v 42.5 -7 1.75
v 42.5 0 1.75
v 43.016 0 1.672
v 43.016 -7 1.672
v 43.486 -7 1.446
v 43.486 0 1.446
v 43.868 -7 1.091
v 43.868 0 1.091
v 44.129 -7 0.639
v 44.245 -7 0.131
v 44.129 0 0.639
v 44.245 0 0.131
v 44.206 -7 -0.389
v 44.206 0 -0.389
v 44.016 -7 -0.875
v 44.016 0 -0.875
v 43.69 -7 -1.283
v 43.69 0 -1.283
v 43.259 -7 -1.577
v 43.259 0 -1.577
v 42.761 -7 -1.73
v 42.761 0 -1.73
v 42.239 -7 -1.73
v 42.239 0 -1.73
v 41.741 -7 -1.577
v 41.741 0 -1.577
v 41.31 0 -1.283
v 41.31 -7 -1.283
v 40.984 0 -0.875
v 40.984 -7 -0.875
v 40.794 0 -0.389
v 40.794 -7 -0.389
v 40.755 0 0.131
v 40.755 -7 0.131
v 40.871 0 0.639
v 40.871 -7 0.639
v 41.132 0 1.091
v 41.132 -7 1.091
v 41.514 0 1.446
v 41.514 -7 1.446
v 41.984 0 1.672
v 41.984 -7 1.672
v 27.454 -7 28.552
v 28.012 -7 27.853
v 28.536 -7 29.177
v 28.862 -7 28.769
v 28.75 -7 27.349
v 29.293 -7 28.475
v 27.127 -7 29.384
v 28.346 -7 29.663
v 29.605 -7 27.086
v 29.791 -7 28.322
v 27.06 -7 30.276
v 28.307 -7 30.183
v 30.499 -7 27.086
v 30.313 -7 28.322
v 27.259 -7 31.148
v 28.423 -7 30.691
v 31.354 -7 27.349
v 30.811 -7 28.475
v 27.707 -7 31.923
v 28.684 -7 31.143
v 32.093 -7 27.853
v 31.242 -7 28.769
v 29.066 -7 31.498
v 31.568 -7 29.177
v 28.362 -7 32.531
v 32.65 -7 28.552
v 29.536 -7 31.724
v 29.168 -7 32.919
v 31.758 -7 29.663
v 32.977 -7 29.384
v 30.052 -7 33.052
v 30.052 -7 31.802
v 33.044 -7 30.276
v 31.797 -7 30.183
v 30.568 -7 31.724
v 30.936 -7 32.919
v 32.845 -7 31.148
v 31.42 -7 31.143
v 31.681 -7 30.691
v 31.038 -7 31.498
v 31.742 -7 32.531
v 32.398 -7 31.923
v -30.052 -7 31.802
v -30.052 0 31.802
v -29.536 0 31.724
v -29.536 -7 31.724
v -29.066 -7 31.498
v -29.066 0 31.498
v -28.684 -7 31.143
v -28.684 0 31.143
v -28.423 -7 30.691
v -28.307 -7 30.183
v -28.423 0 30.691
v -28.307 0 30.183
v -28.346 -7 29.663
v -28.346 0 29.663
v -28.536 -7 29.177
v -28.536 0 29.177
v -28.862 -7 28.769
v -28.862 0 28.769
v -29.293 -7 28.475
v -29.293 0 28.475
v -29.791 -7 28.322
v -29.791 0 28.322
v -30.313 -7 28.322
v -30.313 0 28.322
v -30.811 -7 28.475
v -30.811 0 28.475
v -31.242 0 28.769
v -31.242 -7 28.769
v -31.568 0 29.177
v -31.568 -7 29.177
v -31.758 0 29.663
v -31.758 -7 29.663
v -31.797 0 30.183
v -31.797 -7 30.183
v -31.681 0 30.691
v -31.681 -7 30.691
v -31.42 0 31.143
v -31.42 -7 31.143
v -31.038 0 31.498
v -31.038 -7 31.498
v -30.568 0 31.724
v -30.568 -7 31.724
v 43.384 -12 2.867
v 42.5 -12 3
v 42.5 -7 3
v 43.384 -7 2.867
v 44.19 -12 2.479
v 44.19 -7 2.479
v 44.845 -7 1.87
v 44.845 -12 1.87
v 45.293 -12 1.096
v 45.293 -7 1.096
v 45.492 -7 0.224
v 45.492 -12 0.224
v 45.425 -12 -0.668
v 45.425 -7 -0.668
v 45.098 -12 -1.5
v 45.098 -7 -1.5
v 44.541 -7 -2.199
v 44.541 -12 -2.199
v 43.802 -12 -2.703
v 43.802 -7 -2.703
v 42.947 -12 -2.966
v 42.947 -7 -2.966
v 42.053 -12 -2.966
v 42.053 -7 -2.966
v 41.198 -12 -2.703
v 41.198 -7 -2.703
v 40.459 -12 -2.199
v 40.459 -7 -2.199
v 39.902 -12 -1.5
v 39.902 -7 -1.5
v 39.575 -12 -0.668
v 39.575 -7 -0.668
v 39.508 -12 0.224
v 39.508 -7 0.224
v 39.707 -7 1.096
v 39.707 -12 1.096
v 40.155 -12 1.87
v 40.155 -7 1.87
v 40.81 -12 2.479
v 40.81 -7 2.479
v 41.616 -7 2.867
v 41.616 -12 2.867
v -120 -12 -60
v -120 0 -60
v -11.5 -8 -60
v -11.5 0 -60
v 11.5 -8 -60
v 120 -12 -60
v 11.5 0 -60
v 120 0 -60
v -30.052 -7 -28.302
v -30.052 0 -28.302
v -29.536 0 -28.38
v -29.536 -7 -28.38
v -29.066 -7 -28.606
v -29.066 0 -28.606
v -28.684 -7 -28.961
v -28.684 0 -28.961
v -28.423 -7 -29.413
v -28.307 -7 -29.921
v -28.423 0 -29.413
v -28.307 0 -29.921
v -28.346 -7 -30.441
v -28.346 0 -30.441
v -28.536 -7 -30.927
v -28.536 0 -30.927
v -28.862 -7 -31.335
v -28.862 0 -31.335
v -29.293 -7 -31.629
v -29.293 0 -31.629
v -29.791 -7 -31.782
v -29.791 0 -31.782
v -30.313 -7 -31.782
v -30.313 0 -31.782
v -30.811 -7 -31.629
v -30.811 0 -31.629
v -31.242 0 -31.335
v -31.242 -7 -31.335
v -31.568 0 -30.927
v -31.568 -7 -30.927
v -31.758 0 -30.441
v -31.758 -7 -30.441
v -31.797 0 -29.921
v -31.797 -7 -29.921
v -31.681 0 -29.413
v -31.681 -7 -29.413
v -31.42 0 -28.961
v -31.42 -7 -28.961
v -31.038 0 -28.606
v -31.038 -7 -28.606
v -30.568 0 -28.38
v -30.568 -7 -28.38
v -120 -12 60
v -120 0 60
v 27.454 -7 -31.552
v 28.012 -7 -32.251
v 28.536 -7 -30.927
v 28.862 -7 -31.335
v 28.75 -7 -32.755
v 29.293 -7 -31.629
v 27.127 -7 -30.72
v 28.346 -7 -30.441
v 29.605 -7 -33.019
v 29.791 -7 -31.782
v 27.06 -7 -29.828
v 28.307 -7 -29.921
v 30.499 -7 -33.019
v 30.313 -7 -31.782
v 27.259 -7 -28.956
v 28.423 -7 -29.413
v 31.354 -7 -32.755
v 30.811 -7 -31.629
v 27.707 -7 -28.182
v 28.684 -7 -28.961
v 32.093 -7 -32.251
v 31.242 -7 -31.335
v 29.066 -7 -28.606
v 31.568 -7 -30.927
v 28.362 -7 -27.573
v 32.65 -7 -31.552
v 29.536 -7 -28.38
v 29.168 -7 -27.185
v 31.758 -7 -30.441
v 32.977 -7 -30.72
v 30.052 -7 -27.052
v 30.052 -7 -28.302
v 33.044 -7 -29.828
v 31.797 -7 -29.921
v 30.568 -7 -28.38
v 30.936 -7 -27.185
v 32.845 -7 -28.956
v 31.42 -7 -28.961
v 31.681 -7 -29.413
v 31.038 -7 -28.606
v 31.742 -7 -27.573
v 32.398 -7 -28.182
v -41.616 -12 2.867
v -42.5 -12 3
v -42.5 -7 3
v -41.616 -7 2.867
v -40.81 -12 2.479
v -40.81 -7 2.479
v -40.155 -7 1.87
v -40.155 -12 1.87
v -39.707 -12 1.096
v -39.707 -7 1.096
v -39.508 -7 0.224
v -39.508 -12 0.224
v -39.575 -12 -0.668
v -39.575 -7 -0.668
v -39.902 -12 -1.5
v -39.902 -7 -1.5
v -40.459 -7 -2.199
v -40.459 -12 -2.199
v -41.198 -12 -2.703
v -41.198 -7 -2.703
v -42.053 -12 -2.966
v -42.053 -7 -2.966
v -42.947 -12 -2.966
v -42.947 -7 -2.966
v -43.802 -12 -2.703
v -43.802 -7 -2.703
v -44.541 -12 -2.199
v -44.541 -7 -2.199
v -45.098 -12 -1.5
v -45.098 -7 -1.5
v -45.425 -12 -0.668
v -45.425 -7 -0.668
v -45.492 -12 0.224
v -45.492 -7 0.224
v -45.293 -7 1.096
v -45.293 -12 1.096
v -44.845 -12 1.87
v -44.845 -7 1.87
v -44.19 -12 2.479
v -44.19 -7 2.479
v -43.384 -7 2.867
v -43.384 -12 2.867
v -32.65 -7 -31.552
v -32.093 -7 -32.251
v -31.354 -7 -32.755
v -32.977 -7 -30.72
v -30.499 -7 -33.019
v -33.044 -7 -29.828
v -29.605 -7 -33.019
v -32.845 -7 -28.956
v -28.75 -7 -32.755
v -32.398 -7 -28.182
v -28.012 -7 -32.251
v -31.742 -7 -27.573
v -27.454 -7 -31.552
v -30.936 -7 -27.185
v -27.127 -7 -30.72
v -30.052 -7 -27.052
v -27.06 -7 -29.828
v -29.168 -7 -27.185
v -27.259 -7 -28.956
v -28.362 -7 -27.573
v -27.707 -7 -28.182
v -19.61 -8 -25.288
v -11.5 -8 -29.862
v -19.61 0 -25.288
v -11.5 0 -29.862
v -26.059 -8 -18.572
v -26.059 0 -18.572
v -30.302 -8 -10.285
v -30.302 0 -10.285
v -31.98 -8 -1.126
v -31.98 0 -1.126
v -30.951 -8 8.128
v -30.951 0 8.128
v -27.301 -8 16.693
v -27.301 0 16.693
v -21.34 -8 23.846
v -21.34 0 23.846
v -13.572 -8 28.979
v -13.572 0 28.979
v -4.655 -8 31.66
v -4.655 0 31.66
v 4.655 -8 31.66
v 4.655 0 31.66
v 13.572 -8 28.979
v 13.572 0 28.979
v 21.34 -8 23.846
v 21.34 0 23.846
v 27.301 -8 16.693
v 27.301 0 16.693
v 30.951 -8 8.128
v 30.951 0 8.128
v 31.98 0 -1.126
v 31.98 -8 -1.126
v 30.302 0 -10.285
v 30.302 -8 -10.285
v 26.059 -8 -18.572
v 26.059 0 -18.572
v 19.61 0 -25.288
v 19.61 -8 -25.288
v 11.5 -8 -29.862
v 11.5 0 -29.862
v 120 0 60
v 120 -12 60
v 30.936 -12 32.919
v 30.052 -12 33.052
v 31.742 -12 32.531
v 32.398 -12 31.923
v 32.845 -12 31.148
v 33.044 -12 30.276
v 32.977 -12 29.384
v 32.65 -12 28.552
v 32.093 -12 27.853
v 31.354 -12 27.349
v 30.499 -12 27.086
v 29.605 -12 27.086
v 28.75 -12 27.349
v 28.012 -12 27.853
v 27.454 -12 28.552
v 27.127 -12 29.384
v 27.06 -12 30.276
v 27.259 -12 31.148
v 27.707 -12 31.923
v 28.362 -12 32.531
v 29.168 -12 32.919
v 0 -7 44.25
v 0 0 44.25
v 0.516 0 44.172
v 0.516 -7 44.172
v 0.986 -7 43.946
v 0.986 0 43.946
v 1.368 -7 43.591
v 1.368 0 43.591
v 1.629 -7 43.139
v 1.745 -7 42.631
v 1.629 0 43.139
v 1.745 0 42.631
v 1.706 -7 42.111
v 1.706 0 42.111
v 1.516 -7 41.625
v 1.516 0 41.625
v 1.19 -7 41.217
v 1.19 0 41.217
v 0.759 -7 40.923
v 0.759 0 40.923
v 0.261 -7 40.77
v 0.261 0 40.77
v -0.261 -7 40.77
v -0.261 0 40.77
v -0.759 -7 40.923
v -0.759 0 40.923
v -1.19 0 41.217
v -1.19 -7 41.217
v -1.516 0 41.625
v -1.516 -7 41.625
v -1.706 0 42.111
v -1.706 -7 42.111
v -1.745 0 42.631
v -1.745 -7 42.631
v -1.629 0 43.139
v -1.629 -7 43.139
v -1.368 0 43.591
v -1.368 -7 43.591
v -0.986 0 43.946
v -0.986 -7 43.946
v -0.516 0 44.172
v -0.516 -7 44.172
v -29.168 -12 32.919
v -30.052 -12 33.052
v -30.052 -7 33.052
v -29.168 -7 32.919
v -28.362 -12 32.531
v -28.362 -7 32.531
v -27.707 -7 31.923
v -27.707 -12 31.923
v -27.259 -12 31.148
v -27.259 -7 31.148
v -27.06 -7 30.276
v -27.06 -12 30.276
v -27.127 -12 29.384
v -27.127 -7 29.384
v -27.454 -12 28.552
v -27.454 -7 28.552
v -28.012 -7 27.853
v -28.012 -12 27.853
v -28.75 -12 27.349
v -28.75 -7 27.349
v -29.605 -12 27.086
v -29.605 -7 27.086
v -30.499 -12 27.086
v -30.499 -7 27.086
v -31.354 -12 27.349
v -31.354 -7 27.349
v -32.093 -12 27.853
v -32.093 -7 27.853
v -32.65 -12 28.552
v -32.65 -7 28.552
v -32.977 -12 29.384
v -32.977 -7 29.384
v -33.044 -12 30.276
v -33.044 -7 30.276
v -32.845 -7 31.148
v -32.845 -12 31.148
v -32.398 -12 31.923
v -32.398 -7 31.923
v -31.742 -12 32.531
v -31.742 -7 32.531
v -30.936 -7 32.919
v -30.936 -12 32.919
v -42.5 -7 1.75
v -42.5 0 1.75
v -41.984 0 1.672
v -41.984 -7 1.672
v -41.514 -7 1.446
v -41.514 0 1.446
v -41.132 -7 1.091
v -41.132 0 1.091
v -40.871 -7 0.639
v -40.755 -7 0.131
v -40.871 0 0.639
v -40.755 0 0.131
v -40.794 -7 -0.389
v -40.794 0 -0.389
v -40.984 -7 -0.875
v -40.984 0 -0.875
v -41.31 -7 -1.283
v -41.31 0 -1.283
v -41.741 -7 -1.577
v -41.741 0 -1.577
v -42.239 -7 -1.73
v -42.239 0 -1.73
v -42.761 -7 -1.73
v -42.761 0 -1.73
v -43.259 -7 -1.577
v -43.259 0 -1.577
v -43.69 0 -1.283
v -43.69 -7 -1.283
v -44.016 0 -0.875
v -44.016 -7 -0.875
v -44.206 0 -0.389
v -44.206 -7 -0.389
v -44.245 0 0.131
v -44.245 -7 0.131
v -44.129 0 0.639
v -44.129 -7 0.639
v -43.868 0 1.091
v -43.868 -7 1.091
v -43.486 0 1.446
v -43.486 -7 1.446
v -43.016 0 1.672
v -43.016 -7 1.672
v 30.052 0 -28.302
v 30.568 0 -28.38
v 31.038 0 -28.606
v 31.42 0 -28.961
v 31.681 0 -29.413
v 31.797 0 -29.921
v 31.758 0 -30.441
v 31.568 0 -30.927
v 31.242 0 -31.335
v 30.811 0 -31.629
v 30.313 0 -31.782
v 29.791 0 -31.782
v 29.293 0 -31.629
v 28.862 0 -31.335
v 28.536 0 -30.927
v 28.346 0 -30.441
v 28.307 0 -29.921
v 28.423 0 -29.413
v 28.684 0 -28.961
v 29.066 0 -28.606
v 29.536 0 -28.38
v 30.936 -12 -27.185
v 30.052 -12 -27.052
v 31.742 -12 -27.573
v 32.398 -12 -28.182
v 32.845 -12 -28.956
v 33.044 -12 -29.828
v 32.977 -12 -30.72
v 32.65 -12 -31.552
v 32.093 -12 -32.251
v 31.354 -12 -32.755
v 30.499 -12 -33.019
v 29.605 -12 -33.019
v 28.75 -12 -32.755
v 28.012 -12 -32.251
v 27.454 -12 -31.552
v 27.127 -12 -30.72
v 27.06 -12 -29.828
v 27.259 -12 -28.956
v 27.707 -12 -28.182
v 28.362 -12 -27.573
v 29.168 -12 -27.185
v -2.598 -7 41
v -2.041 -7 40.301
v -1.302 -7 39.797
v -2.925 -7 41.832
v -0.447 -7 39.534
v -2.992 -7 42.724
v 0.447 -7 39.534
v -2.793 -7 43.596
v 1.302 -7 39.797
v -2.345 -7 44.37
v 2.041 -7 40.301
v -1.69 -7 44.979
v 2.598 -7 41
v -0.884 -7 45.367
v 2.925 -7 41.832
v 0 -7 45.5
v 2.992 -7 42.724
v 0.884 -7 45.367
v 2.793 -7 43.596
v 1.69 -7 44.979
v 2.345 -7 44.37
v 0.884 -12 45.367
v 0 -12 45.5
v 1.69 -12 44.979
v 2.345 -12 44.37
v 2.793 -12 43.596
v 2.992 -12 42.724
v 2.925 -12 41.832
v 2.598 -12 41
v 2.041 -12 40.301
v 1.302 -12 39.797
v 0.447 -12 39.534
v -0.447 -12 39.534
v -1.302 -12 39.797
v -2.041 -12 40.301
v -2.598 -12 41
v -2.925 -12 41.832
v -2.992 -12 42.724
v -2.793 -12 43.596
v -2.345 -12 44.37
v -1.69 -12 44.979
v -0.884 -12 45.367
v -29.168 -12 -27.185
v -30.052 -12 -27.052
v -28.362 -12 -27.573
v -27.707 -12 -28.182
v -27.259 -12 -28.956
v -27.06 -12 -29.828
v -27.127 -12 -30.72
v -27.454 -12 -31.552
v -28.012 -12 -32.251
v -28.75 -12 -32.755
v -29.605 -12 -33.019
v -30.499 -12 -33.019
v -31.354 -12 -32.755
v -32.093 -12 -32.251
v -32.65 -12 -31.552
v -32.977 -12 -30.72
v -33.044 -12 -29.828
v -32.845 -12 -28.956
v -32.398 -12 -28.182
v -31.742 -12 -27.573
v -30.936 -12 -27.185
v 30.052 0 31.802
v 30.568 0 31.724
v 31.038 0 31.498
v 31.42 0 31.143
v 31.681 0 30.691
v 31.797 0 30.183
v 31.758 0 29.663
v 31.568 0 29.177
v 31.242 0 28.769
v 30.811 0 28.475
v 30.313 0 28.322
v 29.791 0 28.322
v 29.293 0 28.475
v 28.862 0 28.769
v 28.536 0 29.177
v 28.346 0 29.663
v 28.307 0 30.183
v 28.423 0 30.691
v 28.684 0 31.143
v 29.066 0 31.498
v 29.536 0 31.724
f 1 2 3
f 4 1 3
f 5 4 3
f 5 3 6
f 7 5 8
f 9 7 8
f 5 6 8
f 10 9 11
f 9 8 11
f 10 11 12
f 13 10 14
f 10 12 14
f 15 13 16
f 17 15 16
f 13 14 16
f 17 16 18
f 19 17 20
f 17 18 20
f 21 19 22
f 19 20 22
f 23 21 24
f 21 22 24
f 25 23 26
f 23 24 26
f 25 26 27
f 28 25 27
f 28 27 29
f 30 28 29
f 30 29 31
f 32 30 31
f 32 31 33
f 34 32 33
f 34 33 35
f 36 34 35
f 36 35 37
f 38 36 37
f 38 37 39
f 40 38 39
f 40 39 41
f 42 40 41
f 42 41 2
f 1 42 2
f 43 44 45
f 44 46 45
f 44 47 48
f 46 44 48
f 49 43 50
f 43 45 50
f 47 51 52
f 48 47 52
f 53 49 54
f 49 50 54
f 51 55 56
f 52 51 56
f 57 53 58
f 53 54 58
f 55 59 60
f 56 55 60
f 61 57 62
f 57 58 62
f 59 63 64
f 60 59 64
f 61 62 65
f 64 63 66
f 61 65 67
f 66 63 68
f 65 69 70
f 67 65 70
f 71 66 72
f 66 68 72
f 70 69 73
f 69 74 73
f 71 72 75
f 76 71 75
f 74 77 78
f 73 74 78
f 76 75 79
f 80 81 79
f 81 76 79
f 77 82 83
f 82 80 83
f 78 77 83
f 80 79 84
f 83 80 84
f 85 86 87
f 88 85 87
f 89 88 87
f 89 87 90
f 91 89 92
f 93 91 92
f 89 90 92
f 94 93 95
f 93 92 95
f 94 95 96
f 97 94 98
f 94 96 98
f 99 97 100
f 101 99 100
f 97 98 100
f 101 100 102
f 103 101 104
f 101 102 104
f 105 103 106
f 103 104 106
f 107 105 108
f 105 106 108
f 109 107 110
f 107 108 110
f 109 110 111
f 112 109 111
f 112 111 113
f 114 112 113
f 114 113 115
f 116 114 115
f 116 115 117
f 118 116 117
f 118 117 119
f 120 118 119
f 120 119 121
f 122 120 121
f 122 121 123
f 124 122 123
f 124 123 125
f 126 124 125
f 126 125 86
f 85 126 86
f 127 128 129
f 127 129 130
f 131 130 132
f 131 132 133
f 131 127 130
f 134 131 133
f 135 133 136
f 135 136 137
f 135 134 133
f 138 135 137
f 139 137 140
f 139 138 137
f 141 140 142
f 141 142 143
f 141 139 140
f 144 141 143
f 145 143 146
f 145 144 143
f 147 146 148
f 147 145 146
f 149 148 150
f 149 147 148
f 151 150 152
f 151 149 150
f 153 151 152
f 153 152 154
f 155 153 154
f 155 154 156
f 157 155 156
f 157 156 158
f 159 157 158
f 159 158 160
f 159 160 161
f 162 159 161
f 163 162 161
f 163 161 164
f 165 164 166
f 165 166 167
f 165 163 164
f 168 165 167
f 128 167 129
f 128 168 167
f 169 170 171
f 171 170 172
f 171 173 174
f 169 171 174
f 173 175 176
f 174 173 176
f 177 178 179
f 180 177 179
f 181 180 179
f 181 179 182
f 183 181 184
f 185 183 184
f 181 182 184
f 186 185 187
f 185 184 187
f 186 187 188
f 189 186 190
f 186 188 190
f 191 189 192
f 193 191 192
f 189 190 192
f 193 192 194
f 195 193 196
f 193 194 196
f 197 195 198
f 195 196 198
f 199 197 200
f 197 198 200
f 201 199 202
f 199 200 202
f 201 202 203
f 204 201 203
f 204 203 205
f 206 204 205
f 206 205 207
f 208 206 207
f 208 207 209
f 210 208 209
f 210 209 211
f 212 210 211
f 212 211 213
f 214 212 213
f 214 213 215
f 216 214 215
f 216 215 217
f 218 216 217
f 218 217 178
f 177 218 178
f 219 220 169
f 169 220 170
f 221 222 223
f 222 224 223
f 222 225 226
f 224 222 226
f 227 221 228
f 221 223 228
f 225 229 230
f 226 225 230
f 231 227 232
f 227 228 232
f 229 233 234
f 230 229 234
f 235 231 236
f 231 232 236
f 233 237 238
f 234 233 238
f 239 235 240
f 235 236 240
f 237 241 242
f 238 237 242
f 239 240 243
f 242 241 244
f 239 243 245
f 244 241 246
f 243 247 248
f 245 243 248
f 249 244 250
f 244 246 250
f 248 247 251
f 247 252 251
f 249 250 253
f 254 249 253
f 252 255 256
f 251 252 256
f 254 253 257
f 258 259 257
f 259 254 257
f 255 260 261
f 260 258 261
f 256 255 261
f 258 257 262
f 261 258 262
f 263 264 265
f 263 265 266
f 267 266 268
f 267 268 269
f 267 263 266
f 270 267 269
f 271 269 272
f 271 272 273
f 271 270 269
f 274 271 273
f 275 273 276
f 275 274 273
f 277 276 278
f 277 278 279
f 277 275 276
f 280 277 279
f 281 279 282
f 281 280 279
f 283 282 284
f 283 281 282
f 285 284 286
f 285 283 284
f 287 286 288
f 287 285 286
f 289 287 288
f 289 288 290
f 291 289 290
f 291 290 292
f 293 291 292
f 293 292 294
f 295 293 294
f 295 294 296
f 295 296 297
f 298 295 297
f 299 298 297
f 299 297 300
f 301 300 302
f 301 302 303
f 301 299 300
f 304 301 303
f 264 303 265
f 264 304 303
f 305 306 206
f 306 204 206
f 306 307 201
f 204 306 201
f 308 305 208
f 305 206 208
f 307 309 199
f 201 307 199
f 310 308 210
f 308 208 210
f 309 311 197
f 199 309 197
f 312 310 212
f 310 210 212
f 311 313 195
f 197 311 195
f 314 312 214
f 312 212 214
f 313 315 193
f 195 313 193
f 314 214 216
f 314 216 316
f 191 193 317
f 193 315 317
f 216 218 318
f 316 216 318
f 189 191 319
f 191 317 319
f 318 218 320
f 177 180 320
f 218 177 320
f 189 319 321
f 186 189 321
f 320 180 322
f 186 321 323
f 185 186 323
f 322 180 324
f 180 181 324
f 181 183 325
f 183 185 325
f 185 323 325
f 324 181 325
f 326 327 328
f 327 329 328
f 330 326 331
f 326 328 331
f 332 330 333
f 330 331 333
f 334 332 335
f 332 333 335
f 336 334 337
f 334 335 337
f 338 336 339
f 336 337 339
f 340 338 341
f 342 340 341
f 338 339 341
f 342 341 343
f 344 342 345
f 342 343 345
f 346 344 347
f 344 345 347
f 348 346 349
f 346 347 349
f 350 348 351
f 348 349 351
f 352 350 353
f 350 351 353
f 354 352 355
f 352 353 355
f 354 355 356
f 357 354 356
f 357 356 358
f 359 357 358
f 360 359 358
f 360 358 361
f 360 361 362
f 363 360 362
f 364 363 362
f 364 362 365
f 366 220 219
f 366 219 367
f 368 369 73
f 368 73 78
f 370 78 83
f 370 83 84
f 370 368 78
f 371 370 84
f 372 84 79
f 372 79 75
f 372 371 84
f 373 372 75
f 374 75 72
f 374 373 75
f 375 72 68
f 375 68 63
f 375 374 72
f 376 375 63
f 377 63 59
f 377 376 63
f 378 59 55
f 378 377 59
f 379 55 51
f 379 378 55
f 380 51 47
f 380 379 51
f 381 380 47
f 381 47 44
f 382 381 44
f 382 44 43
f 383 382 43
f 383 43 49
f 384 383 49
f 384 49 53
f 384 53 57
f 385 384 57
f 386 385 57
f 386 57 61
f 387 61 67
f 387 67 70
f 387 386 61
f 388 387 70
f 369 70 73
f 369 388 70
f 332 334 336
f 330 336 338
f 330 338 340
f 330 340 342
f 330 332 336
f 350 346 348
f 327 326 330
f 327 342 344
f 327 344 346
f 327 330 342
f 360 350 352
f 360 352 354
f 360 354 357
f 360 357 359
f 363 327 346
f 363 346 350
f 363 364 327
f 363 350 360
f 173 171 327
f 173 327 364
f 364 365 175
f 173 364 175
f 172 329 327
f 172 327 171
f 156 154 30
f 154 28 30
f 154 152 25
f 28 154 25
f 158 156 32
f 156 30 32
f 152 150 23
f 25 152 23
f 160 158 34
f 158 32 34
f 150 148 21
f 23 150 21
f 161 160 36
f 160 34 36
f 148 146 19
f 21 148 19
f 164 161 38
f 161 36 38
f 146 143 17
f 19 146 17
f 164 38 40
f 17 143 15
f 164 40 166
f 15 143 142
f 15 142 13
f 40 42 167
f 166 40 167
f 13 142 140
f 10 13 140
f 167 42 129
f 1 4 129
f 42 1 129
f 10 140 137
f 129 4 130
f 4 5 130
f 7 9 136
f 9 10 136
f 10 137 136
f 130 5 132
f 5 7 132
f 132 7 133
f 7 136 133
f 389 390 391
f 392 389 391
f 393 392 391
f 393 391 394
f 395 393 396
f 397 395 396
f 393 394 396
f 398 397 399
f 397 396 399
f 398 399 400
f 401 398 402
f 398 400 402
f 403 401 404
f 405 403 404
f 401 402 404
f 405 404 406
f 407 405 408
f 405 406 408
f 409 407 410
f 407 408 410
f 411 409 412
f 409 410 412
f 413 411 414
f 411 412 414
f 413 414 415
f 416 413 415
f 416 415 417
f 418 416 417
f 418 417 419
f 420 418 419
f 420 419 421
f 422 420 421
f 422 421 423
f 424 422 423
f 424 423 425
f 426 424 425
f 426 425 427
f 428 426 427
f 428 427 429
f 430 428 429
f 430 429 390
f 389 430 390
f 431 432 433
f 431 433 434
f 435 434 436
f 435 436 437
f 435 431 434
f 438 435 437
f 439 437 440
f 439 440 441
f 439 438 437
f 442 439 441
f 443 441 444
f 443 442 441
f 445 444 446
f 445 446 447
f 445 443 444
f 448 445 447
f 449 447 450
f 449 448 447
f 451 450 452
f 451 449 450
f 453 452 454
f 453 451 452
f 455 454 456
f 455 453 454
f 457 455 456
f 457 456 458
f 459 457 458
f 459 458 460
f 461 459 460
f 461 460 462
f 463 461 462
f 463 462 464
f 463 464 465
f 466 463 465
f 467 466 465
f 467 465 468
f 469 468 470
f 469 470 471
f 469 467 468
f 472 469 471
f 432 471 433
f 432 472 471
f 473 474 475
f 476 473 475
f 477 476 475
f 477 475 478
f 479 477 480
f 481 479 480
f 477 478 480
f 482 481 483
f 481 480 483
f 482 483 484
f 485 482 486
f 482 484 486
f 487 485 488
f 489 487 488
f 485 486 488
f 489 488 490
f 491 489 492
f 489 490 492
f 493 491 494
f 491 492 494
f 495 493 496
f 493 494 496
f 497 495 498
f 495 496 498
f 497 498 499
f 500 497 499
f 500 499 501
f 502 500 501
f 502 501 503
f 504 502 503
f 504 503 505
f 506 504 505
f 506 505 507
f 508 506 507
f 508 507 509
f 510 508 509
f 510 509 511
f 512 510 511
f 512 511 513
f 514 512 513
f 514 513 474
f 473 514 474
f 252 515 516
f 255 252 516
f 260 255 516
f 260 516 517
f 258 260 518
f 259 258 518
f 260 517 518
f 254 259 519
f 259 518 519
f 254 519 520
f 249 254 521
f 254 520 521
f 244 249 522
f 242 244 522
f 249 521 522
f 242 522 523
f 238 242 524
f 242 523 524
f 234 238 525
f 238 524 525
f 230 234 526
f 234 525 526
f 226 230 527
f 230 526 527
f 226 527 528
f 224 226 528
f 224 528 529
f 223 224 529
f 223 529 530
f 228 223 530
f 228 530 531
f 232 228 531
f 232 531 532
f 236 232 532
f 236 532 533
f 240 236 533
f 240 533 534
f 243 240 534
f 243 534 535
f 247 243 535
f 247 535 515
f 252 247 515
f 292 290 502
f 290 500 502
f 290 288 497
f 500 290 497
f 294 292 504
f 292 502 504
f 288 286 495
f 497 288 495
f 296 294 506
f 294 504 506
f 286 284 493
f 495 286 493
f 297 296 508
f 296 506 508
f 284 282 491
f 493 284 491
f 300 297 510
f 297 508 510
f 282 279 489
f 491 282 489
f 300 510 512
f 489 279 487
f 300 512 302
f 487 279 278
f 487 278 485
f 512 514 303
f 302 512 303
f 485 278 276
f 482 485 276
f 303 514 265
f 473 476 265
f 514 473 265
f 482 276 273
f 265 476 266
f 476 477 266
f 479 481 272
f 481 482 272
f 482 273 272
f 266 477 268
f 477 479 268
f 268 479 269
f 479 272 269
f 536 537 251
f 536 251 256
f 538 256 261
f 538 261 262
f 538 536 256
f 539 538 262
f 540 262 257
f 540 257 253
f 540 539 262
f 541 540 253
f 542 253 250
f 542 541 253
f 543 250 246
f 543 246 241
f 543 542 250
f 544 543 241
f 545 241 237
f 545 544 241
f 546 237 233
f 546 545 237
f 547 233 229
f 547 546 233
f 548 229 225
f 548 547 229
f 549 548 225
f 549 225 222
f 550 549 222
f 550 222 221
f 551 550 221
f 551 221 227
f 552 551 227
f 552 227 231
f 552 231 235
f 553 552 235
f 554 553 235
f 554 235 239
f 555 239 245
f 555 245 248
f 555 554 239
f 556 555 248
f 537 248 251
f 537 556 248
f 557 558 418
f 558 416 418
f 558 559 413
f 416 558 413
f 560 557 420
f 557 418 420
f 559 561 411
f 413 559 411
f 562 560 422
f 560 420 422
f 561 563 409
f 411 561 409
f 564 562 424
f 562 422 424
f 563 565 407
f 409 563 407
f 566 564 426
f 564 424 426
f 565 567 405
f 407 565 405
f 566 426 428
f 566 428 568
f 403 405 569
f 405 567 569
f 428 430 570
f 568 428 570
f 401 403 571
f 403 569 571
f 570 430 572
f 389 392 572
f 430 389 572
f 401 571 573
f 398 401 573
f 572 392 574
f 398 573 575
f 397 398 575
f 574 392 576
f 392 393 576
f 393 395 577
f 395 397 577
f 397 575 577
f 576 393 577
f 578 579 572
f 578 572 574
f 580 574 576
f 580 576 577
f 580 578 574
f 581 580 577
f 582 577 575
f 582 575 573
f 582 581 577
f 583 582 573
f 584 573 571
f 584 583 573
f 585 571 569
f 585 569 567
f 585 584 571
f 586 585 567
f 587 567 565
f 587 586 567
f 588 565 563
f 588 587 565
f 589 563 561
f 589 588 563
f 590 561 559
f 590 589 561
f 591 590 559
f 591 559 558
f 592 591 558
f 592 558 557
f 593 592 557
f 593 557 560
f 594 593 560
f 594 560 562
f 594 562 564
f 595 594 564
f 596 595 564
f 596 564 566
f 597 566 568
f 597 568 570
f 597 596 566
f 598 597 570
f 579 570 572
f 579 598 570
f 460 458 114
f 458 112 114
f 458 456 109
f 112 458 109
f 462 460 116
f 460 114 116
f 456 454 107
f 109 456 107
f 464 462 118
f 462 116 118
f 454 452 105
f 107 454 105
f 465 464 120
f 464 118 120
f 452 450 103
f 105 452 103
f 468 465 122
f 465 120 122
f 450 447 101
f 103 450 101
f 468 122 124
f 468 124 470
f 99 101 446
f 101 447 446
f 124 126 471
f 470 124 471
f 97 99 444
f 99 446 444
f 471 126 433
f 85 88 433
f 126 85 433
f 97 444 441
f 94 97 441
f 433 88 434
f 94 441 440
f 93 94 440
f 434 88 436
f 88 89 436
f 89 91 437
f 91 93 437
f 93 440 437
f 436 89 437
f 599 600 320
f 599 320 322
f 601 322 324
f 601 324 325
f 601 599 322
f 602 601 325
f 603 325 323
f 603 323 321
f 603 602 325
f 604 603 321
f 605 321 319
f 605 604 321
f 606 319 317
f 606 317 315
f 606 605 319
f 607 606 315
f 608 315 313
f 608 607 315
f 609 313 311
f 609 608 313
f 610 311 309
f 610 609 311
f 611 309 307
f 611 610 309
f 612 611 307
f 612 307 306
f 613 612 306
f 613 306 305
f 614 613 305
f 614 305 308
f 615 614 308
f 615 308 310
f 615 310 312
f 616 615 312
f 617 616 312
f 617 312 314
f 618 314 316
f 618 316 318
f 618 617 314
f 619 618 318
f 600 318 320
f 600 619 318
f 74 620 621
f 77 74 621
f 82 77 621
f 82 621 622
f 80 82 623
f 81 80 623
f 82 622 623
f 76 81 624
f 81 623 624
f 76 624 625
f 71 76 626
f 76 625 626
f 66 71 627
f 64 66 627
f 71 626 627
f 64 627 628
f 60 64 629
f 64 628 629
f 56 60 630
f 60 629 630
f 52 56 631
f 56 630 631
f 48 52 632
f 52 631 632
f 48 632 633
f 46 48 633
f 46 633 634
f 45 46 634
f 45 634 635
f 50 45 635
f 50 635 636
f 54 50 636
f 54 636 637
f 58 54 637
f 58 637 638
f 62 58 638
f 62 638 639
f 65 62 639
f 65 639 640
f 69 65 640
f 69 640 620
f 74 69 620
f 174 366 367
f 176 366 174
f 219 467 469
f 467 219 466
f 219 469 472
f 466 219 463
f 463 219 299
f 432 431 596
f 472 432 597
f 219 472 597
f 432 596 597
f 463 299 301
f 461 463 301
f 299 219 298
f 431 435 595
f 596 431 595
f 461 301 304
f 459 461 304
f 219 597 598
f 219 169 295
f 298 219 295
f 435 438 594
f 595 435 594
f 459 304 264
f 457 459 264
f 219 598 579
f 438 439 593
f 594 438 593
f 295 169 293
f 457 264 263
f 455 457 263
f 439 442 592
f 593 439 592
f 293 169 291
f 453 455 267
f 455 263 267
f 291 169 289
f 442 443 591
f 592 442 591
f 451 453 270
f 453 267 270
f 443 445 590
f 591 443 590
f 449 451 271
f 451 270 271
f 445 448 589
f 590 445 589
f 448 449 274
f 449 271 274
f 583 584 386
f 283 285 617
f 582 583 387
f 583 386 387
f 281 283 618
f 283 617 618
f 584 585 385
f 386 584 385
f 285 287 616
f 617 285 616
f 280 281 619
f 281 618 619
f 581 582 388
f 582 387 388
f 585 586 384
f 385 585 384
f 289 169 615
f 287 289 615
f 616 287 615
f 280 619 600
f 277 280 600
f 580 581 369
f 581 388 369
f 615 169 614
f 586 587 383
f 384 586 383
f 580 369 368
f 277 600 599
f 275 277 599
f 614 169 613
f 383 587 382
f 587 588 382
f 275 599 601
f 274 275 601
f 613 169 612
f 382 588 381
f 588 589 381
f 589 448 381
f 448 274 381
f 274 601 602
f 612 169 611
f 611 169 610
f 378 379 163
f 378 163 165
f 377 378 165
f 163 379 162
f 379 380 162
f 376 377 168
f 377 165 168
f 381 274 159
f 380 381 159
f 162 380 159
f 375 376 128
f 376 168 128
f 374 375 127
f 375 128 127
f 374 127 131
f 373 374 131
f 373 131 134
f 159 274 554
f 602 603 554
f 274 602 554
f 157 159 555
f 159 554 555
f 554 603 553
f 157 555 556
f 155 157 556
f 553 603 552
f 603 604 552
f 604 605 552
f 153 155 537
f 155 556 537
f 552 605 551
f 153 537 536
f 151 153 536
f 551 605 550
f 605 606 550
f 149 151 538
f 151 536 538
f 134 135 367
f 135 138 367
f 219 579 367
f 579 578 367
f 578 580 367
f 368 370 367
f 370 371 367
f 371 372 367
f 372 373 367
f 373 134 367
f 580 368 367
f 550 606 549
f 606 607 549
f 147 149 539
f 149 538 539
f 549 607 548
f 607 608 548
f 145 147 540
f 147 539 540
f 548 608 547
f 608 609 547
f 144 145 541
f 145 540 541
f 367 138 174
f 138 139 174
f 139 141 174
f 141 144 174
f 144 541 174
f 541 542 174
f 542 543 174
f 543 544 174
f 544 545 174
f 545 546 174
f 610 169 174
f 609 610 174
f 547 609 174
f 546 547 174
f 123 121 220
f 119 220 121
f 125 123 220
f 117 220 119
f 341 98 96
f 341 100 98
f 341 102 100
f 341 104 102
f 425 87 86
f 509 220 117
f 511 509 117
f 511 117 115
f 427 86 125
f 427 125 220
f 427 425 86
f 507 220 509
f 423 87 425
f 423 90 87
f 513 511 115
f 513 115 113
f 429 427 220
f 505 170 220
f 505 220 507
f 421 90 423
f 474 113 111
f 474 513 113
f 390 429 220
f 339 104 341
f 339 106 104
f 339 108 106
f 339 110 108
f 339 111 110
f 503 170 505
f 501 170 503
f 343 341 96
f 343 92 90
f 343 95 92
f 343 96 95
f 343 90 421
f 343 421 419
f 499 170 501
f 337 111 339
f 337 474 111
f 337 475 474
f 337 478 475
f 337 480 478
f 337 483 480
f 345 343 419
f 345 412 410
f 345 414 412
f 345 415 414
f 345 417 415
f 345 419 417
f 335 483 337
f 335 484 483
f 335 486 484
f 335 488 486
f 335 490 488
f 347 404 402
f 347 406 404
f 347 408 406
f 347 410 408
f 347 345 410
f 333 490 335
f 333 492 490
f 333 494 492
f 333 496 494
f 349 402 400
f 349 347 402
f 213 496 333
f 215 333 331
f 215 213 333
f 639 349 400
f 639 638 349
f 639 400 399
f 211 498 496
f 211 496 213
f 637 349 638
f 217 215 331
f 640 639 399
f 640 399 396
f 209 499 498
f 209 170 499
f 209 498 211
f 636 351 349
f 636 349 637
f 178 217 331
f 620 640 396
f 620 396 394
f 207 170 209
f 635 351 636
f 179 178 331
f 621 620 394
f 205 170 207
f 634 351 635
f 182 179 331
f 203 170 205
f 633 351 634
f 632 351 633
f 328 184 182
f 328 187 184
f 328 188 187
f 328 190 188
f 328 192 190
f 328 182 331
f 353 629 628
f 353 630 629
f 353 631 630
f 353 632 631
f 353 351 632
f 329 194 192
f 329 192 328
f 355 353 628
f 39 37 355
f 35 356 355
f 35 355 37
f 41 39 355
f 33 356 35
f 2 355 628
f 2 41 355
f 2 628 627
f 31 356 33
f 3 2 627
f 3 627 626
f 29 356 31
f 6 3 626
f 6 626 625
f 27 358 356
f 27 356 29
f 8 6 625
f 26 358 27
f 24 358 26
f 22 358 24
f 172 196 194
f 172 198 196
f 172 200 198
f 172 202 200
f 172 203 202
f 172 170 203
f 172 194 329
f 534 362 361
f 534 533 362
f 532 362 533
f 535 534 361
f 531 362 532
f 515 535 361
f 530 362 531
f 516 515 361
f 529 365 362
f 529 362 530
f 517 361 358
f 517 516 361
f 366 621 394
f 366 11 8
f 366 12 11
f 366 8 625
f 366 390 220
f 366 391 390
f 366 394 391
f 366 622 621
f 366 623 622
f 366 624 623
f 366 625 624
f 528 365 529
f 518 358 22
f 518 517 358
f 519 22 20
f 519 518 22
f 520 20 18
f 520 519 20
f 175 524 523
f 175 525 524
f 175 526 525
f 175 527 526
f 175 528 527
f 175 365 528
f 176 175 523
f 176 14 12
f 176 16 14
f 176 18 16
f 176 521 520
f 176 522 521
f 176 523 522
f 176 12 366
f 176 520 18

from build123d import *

# Parameters (mm, degrees)
SKETCH1_W           = 240
SKETCH1_H           = 120
BOSS_EXTRUDE1_DEPTH = 12
SKETCH2_R           = 32
CUT_EXTRUDE1_DEPTH  = 8
SKETCH3_W           = 23
SKETCH3_H           = 30.466372505
CUT_EXTRUDE2_DEPTH  = 8
SKETCH4_R           = 1.75
CUT_EXTRUDE4_DEPTH  = 20
SKETCH5_R           = 3
CUT_EXTRUDE7_DEPTH  = 5


with BuildPart() as part:
    # Sketch1 → Boss-Extrude1 (new body)
    with BuildSketch(Plane(origin=(0, 0, 0), x_dir=(1, 0, 0), z_dir=(0, 1, 0))):
        Rectangle(SKETCH1_W, SKETCH1_H)
    extrude(amount=-BOSS_EXTRUDE1_DEPTH)

    # Sketch2 → Cut-Extrude1 (cut)
    with BuildSketch(Plane(origin=(0, 0, 0), x_dir=(1, 0, 0), z_dir=(0, 1, 0))):
        with Locations(Location((0, 0, 0), (0, 0, 270))):
            Circle(SKETCH2_R)
    extrude(amount=-CUT_EXTRUDE1_DEPTH, mode=Mode.SUBTRACT)

    # Sketch3 → Cut-Extrude2 (cut)
    with BuildSketch(Plane(origin=(0, 0, 0), x_dir=(1, 0, 0), z_dir=(0, 1, 0))):
        with Locations((0, 44.766813748)):
            Rectangle(SKETCH3_W, SKETCH3_H)
    extrude(amount=-CUT_EXTRUDE2_DEPTH, mode=Mode.SUBTRACT)

    # Sketch4 → Cut-Extrude4 (cut)
    with BuildSketch(Plane(origin=(0, 0, 0), x_dir=(1, 0, 0), z_dir=(0, 1, 0))):
        with Locations(Location((-42.5, 0, 0), (0, 0, 270))):
            Circle(SKETCH4_R)
        with Locations(Location((-30.0520382, 30.0520382, 0), (0, 0, 270))):
            Circle(SKETCH4_R)
        with Locations(Location((30.0520382, 30.0520382, 0), (0, 0, 270))):
            Circle(SKETCH4_R)
        with Locations(Location((42.5, 0, 0), (0, 0, 270))):
            Circle(SKETCH4_R)
        with Locations(Location((30.0520382, -30.0520382, 0), (0, 0, 270))):
            Circle(SKETCH4_R)
        with Locations(Location((0, -42.5, 0), (0, 0, 270))):
            Circle(SKETCH4_R)
        with Locations(Location((-30.0520382, -30.0520382, 0), (0, 0, 270))):
            Circle(SKETCH4_R)
    extrude(amount=-CUT_EXTRUDE4_DEPTH, mode=Mode.SUBTRACT)

    # Sketch5 → Cut-Extrude7 (cut)
    with BuildSketch(Plane(origin=(0, -12, 0), x_dir=(1, 0, 0), z_dir=(0, 1, 0))):
        with Locations(Location((-42.5, 0, 0), (0, 0, 270))):
            Circle(SKETCH5_R)
        with Locations(Location((-30.0520382, 30.0520382, 0), (0, 0, 270))):
            Circle(SKETCH5_R)
        with Locations(Location((30.0520382, 30.0520382, 0), (0, 0, 270))):
            Circle(SKETCH5_R)
        with Locations(Location((42.5, 0, 0), (0, 0, 270))):
            Circle(SKETCH5_R)
        with Locations(Location((30.0520382, -30.0520382, 0), (0, 0, 270))):
            Circle(SKETCH5_R)
        with Locations(Location((0, -42.5, 0), (0, 0, 270))):
            Circle(SKETCH5_R)
        with Locations(Location((-30.0520382, -30.0520382, 0), (0, 0, 270))):
            Circle(SKETCH5_R)
    extrude(amount=CUT_EXTRUDE7_DEPTH, mode=Mode.SUBTRACT)


solid = part.part
